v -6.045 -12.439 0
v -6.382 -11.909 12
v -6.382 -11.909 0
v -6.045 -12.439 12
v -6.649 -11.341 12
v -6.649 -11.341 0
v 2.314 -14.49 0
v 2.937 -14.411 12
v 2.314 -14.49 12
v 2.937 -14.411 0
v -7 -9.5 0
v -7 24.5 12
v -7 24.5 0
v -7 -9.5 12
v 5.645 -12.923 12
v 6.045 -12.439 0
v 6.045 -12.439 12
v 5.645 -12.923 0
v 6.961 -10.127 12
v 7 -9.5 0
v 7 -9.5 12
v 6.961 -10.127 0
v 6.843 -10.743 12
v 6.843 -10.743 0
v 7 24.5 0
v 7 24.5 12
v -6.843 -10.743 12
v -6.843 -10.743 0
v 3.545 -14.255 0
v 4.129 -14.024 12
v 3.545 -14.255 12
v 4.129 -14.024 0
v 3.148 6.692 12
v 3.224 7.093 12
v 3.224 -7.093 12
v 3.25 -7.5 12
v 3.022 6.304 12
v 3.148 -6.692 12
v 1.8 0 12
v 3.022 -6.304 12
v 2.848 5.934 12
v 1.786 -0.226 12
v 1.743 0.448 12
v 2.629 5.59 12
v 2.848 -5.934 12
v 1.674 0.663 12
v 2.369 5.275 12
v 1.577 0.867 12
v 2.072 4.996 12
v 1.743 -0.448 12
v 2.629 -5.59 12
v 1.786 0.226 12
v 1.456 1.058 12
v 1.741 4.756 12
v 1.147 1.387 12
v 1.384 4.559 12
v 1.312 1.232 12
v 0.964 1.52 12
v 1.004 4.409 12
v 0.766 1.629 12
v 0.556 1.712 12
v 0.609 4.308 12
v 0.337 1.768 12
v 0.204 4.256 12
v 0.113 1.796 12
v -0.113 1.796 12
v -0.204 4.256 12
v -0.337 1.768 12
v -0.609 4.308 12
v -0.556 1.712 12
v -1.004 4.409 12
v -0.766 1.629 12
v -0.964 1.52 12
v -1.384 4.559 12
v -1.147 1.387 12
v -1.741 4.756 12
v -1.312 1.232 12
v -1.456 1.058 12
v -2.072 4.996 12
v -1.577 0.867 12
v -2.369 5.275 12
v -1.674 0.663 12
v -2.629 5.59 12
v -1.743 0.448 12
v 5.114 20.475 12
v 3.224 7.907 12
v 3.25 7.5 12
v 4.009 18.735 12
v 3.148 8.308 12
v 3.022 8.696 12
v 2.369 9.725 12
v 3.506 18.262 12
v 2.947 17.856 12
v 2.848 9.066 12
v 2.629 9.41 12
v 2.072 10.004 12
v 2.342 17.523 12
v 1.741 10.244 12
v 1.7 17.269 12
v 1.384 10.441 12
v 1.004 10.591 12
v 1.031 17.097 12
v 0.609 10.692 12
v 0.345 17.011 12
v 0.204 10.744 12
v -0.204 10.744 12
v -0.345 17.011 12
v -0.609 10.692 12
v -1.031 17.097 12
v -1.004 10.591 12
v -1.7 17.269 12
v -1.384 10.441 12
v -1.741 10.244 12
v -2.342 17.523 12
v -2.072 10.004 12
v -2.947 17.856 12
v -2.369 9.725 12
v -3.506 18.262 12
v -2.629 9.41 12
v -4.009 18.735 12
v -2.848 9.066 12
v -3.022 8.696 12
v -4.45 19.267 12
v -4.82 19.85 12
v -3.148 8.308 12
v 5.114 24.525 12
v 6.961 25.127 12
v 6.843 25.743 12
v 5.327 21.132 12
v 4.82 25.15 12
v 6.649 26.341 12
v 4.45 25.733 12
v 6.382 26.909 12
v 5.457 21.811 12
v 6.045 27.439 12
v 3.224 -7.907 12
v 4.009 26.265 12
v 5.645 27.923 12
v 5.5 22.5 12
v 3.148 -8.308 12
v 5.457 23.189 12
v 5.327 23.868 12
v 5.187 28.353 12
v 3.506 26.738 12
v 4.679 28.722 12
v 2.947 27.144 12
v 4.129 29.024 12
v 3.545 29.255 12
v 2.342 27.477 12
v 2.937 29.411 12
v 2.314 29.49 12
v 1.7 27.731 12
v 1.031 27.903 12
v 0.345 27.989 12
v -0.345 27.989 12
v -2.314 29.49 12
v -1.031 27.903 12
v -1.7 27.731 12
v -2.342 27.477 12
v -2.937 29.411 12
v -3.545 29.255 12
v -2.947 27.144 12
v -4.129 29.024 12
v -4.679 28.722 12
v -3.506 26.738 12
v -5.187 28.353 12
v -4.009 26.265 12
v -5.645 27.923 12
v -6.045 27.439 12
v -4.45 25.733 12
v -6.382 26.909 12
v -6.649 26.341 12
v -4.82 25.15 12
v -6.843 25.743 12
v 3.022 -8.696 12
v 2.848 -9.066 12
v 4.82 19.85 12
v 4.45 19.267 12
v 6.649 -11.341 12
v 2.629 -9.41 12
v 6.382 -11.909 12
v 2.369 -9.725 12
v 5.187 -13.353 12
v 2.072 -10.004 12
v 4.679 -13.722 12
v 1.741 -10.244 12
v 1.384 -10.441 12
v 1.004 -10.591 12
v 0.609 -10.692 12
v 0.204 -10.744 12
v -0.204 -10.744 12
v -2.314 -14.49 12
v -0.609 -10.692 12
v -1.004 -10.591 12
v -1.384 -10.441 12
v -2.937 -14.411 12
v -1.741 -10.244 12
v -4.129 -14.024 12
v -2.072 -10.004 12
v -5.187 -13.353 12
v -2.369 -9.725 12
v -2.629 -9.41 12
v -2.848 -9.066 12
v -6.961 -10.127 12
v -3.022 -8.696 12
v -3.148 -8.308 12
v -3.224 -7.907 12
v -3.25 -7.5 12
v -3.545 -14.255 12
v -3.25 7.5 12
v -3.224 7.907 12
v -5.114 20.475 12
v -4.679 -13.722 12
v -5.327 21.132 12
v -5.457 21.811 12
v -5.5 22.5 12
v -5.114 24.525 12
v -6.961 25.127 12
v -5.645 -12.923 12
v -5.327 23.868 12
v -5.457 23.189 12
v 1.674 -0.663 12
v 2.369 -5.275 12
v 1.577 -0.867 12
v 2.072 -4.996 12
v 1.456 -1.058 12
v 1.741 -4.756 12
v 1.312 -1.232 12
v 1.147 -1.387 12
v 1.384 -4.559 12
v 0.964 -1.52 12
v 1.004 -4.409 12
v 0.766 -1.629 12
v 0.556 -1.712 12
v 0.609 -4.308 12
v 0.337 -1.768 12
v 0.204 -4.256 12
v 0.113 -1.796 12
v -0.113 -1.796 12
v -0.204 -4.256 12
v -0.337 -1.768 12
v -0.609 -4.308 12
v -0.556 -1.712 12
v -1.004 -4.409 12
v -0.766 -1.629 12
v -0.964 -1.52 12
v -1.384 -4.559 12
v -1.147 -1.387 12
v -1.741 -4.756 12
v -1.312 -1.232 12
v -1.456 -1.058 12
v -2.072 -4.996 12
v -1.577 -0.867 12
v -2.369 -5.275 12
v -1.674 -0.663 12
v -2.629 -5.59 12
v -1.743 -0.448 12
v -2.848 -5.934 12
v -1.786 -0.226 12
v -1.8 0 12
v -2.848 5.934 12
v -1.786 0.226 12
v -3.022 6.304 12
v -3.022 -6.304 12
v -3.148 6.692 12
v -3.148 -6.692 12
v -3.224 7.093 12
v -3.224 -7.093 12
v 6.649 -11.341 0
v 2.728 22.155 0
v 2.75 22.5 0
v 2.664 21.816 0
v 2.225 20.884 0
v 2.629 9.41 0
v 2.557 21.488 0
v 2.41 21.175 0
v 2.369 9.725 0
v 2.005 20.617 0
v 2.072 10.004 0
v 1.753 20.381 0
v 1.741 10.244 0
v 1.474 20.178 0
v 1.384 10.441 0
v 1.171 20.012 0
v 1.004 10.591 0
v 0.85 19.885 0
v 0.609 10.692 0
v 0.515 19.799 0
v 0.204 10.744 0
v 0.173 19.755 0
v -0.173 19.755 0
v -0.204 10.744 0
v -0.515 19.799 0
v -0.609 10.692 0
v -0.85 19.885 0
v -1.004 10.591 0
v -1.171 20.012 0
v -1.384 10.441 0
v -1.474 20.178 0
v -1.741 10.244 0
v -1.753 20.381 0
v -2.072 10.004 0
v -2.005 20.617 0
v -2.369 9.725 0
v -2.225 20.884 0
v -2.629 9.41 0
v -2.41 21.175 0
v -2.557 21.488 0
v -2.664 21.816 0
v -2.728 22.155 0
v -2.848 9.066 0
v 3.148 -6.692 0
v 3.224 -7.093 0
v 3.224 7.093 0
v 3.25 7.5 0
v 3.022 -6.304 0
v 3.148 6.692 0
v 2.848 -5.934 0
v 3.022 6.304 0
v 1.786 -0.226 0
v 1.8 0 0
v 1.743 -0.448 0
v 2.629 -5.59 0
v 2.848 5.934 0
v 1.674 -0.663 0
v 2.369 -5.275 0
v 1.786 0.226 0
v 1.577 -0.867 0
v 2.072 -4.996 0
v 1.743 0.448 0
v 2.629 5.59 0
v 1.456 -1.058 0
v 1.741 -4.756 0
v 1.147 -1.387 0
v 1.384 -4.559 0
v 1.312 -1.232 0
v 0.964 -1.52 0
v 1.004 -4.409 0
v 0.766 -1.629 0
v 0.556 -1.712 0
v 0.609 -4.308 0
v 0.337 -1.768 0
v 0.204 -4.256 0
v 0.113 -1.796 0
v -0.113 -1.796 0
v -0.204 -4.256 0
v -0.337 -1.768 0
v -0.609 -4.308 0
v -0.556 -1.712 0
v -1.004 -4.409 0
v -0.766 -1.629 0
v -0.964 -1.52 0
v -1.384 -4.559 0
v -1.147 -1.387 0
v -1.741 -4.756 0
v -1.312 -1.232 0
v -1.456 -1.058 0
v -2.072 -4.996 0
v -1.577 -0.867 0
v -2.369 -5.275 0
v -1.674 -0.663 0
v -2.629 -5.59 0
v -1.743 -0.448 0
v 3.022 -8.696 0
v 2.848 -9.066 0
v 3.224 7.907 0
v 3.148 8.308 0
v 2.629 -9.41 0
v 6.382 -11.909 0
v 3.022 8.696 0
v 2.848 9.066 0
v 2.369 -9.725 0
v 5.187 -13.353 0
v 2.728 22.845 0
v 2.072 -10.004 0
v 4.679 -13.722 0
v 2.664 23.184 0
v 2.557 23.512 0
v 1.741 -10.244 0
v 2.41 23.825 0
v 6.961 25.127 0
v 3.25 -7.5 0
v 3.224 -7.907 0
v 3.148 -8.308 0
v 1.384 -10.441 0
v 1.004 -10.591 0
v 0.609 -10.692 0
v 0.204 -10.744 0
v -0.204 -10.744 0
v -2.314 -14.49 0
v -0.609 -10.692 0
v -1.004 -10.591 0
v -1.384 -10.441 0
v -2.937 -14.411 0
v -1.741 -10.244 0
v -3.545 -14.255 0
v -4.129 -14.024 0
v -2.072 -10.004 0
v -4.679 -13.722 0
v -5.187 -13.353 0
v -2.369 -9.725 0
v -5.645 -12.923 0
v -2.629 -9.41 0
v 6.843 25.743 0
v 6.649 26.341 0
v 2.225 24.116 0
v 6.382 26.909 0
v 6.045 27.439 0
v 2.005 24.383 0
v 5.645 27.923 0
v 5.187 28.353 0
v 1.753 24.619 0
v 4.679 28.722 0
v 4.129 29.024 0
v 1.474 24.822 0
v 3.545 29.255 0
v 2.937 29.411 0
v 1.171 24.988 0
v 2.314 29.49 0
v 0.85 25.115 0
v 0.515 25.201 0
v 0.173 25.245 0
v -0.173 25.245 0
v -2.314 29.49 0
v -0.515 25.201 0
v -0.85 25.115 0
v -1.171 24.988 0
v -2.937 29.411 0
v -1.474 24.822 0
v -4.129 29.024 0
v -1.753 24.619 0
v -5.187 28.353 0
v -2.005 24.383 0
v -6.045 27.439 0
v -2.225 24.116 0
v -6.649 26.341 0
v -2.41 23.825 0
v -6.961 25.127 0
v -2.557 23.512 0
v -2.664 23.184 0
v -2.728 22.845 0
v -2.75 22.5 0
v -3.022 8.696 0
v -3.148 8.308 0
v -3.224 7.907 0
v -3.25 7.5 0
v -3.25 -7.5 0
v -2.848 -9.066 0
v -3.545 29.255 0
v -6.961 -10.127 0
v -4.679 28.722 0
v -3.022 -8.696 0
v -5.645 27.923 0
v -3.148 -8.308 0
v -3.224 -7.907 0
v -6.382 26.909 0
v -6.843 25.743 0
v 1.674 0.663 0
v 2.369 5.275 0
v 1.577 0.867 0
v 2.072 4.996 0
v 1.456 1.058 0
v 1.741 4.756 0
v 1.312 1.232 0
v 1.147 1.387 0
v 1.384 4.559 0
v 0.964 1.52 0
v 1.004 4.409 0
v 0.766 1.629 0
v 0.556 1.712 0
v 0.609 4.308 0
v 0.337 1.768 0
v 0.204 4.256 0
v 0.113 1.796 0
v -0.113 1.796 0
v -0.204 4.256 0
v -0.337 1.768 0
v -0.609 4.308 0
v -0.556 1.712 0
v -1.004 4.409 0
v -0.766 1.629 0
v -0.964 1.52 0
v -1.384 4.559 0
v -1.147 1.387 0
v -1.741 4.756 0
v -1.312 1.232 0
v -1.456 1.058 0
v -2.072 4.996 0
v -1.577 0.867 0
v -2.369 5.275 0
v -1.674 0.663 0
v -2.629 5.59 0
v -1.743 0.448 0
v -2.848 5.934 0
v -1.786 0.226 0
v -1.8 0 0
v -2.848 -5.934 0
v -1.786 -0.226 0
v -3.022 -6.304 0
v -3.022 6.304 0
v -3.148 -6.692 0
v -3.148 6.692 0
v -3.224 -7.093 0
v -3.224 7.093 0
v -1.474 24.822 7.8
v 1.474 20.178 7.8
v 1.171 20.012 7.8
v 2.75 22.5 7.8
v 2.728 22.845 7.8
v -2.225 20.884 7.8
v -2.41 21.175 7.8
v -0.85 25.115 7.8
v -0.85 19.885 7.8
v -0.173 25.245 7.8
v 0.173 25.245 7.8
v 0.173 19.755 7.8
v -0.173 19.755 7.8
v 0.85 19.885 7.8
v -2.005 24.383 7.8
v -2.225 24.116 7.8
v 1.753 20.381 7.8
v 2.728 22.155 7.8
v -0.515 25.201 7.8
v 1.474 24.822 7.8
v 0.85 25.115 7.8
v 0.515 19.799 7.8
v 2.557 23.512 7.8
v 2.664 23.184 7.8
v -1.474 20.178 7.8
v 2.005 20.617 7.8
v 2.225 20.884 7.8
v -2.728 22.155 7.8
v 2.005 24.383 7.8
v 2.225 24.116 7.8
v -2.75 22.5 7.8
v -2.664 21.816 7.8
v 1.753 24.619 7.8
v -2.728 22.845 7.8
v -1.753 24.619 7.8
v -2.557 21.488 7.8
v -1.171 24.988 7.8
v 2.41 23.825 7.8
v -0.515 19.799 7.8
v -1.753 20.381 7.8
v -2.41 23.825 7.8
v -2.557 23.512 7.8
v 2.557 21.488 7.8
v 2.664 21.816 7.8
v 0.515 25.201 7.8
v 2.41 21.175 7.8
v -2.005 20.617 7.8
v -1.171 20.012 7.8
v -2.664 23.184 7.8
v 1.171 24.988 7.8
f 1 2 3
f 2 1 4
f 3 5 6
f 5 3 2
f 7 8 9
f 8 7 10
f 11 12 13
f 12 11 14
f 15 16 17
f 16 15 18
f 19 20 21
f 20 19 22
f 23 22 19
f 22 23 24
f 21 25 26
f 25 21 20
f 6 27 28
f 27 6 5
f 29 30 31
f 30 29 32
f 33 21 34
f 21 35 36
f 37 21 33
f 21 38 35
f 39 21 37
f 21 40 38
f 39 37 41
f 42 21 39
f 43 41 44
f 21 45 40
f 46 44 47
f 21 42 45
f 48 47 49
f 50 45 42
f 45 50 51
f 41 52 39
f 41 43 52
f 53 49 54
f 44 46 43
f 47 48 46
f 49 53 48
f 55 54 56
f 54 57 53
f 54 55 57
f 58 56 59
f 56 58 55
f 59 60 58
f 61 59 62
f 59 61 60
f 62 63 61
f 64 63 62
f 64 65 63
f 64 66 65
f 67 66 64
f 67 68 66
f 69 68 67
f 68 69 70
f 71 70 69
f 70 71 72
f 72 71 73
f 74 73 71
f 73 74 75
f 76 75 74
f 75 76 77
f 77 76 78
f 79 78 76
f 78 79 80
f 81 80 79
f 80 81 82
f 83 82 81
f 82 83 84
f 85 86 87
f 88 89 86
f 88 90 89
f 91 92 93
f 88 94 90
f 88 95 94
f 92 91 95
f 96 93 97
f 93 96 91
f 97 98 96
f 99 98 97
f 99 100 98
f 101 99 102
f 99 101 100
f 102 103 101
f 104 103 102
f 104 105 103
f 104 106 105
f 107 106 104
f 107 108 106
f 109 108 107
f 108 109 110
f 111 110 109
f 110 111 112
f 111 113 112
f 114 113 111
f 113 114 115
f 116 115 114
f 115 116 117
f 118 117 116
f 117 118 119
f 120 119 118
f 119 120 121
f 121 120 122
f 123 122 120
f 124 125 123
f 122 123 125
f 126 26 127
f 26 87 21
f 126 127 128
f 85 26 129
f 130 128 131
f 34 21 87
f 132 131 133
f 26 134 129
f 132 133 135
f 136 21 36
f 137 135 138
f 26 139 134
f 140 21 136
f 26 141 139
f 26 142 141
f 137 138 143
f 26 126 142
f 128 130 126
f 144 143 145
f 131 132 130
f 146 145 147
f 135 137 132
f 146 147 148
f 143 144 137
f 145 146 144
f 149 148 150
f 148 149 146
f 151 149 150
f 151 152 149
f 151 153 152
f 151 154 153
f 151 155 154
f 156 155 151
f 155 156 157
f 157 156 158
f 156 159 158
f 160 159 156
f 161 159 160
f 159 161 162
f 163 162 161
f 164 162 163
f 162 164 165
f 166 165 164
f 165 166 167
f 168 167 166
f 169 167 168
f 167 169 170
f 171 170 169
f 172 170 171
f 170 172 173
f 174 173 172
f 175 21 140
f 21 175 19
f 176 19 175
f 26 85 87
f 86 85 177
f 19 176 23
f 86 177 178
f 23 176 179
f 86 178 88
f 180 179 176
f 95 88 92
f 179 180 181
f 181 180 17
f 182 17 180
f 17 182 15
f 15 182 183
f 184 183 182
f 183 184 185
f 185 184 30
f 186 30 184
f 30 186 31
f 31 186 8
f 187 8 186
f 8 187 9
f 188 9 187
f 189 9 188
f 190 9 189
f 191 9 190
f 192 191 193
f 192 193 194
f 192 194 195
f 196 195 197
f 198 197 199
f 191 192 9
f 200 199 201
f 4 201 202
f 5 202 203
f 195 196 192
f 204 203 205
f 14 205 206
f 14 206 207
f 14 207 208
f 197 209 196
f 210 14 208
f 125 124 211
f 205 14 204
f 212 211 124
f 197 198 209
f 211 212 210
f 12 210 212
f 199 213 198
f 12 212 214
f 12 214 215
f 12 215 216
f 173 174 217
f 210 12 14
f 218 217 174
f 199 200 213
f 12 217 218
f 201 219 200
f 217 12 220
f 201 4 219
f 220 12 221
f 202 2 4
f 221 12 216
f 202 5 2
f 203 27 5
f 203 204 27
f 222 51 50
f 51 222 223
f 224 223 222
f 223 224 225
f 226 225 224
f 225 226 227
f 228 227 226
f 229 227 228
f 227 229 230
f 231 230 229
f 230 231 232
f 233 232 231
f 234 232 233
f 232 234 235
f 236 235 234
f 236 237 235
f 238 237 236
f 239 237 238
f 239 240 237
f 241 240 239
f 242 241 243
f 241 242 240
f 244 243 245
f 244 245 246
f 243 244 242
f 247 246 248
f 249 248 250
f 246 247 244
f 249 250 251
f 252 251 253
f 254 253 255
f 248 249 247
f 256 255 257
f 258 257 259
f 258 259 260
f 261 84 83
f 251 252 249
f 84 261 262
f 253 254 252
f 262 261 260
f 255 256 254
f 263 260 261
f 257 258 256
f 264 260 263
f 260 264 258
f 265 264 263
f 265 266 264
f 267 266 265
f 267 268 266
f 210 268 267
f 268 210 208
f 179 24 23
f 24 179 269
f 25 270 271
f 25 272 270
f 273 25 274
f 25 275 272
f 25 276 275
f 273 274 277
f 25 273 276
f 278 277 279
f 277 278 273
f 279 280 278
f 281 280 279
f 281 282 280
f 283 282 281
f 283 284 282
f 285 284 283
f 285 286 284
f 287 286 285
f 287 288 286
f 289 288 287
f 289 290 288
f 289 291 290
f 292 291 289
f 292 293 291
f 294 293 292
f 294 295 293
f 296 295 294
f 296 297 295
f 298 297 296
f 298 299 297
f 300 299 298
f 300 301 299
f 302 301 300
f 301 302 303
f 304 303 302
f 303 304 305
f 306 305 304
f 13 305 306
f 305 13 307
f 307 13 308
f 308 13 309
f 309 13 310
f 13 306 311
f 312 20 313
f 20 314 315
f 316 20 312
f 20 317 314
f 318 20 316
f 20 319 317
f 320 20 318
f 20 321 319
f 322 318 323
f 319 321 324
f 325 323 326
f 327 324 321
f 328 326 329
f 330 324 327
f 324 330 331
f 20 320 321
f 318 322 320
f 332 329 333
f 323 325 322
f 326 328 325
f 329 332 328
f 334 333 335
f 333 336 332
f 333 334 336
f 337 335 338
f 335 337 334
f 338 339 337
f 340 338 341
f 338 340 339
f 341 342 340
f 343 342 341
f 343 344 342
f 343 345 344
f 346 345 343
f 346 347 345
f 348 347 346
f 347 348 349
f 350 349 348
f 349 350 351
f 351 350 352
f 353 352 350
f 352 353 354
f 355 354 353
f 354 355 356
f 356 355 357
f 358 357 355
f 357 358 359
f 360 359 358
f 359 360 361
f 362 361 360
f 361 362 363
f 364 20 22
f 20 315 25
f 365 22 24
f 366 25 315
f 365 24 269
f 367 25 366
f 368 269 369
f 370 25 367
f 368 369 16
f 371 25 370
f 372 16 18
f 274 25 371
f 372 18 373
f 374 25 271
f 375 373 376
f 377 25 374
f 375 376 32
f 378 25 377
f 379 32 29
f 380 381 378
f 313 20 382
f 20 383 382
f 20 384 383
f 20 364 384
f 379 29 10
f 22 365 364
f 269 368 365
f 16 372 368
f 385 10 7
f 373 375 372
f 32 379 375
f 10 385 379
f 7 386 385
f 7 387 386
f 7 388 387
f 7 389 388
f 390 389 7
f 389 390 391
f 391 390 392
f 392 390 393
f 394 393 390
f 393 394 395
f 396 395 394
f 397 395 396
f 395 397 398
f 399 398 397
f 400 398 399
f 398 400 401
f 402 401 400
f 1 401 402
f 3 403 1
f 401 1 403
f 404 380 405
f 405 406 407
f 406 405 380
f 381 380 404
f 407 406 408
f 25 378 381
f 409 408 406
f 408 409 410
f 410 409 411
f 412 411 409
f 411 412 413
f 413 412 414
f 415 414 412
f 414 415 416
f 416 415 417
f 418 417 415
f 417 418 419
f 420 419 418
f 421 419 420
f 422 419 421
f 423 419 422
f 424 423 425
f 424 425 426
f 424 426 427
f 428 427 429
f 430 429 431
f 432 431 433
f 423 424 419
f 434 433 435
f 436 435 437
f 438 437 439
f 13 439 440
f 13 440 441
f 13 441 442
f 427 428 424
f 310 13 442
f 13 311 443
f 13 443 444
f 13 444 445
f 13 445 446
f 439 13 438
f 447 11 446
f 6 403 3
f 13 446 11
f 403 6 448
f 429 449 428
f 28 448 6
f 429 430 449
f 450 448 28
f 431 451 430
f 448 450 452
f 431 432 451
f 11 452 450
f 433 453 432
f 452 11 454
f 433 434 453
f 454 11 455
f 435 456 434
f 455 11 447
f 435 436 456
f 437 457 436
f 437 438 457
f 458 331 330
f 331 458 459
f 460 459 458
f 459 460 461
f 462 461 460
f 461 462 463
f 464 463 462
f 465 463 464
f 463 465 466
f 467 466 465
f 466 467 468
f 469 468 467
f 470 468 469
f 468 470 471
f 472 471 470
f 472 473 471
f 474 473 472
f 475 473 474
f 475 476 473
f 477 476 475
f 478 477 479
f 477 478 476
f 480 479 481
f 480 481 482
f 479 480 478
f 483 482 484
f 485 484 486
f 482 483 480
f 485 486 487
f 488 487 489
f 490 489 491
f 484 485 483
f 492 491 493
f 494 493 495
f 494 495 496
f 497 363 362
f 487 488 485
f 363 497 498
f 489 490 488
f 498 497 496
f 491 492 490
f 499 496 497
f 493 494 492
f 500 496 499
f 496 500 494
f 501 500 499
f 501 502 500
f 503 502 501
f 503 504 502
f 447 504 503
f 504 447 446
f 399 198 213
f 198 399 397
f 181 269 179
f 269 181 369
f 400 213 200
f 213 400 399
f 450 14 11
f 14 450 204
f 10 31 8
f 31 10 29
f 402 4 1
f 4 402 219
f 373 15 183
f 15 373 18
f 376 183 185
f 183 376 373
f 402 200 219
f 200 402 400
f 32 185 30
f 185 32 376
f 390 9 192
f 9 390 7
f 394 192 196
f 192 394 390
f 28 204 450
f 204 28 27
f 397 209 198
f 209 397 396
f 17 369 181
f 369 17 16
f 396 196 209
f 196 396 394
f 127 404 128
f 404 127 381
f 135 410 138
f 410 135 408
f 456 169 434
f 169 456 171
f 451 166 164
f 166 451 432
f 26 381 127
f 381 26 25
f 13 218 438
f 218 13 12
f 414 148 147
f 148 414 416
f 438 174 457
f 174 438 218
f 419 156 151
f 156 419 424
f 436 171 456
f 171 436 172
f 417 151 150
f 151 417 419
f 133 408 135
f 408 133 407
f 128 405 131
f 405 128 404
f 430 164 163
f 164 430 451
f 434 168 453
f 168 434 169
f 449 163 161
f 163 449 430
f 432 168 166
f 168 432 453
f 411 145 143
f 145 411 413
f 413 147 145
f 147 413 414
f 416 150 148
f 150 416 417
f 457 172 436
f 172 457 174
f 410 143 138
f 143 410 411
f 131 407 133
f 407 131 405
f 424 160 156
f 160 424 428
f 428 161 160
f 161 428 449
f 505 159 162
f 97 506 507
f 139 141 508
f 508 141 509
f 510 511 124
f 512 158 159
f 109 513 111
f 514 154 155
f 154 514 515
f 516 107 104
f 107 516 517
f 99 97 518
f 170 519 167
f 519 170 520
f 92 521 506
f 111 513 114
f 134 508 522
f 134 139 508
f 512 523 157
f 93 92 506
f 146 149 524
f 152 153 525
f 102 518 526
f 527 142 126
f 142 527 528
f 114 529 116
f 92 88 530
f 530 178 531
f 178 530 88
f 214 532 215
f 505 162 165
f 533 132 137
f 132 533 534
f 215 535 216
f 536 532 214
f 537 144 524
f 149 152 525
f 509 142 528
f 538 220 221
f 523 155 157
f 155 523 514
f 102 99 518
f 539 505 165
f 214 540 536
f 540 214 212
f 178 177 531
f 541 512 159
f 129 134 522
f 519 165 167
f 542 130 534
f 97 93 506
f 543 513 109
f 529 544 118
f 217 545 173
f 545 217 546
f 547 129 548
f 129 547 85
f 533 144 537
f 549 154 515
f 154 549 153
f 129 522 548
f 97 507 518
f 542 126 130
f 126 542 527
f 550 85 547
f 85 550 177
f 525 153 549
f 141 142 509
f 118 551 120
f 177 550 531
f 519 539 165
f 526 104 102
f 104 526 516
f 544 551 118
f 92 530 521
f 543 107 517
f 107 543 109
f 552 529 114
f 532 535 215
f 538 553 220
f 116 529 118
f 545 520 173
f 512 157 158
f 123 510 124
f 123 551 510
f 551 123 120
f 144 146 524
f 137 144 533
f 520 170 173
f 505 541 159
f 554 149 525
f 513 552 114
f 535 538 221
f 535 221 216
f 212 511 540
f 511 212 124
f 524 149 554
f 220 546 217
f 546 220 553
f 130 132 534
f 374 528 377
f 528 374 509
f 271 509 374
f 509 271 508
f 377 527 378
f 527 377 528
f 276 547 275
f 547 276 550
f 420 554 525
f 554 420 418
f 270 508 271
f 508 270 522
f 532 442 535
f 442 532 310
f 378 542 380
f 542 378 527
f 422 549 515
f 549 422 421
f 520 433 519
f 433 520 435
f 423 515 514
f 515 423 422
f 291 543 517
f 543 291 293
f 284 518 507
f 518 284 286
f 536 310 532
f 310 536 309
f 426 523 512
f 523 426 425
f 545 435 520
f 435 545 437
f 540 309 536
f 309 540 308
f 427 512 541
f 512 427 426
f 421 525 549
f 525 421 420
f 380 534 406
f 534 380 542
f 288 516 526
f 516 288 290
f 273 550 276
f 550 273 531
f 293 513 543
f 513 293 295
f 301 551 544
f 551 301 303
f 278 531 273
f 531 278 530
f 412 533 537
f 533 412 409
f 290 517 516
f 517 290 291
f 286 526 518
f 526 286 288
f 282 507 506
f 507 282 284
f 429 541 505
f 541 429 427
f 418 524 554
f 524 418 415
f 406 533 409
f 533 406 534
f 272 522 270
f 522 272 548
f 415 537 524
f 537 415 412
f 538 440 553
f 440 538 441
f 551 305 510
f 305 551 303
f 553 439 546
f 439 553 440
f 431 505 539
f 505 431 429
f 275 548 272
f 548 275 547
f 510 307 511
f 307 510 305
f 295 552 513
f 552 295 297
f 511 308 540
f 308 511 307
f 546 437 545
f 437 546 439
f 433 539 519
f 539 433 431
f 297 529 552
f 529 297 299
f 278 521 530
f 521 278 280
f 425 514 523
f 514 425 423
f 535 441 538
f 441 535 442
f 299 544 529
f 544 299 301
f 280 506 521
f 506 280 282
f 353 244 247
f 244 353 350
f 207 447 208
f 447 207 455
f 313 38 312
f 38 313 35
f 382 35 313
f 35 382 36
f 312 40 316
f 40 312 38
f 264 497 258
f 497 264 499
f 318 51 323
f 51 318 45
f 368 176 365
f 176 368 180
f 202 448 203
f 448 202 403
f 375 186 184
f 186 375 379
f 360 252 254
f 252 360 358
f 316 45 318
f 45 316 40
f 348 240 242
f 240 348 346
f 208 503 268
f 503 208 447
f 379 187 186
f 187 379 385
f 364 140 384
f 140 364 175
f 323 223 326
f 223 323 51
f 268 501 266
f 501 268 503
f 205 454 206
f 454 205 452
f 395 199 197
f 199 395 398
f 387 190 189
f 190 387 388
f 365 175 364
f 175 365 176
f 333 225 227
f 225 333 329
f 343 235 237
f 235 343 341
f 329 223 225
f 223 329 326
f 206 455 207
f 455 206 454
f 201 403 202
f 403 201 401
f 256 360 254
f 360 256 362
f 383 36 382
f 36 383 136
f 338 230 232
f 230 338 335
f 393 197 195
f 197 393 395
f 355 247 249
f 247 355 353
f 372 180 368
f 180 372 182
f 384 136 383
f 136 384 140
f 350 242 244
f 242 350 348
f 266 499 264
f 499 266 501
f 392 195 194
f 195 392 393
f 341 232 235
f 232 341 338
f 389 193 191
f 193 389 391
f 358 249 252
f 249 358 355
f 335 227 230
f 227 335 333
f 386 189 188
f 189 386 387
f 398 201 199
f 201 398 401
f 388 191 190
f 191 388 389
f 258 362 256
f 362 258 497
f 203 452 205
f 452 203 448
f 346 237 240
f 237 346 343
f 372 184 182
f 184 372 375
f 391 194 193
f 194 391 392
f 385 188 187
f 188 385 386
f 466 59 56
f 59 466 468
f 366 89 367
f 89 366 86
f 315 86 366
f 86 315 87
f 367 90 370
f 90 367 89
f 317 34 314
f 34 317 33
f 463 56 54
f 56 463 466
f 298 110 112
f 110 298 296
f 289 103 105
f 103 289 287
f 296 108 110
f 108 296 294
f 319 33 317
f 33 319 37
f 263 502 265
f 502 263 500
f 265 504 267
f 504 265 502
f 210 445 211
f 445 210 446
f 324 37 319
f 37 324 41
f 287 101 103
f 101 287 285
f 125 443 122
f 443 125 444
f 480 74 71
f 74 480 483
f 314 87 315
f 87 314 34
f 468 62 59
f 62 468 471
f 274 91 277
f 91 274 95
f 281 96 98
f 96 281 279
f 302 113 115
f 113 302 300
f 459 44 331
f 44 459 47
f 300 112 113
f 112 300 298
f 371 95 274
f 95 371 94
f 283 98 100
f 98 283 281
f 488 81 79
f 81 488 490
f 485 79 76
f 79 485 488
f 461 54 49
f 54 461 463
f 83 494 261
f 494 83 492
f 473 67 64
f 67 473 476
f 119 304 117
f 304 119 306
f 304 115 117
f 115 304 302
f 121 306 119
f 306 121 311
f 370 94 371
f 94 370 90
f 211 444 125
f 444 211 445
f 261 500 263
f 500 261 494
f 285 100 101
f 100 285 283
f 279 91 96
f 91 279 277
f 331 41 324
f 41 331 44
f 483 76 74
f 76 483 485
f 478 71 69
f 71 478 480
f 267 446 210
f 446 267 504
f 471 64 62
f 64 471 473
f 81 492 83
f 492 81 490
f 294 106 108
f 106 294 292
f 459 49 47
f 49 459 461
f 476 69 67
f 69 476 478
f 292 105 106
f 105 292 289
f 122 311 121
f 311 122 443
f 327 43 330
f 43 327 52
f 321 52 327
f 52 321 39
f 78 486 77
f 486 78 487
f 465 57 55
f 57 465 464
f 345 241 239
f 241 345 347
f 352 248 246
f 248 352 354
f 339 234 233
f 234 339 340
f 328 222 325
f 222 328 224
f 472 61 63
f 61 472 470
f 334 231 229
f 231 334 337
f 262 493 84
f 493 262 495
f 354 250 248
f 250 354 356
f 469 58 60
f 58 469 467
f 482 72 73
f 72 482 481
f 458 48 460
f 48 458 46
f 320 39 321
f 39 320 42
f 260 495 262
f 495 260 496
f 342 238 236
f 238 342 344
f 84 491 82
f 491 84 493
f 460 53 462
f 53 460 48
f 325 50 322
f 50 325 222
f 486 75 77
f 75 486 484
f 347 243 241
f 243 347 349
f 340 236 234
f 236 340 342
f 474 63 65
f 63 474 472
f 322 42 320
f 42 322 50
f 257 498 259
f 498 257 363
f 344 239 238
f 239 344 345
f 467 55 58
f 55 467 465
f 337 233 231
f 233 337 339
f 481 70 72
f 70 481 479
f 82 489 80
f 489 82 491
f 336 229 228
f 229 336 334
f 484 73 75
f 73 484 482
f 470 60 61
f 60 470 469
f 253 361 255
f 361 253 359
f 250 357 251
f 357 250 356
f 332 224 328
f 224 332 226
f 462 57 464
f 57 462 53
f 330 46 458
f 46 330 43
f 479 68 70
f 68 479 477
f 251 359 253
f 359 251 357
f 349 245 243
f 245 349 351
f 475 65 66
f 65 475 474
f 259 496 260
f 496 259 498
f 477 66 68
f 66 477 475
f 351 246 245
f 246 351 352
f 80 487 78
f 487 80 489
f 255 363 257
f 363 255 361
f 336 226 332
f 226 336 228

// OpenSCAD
$fn = 50;


difference() {
	union() {
		hull() {
			translate(v = [-2.0000000000, 9.5000000000, 0]) {
				cylinder(h = 12, r = 5);
			}
			translate(v = [2.0000000000, 9.5000000000, 0]) {
				cylinder(h = 12, r = 5);
			}
			translate(v = [-2.0000000000, -9.5000000000, 0]) {
				cylinder(h = 12, r = 5);
			}
			translate(v = [2.0000000000, -9.5000000000, 0]) {
				cylinder(h = 12, r = 5);
			}
		}
		translate(v = [0.0000000000, 15.0000000000, 0]) {
			hull() {
				translate(v = [-2.0000000000, 9.5000000000, 0]) {
					cylinder(h = 12, r = 5);
				}
				translate(v = [2.0000000000, 9.5000000000, 0]) {
					cylinder(h = 12, r = 5);
				}
				translate(v = [-2.0000000000, -9.5000000000, 0]) {
					cylinder(h = 12, r = 5);
				}
				translate(v = [2.0000000000, -9.5000000000, 0]) {
					cylinder(h = 12, r = 5);
				}
			}
		}
		translate(v = [0.0000000000, 15.0000000000, 0]) {
			hull() {
				translate(v = [-2.0000000000, 9.5000000000, 0]) {
					cylinder(h = 12, r = 5);
				}
				translate(v = [2.0000000000, 9.5000000000, 0]) {
					cylinder(h = 12, r = 5);
				}
				translate(v = [-2.0000000000, -9.5000000000, 0]) {
					cylinder(h = 12, r = 5);
				}
				translate(v = [2.0000000000, -9.5000000000, 0]) {
					cylinder(h = 12, r = 5);
				}
			}
		}
	}
	union() {
		translate(v = [0.0000000000, 22.5000000000, 12]) {
			rotate(a = [0, 0, 0]) {
				difference() {
					union() {
						#translate(v = [0, 0, -12.0000000000]) {
							cylinder(h = 12, r = 2.2500000000);
						}
						#translate(v = [0, 0, -4.2000000000]) {
							cylinder(h = 4.2000000000, r1 = 2.7500000000, r2 = 5.5000000000);
						}
						#translate(v = [0, 0, -12.0000000000]) {
							cylinder(h = 12, r = 2.7500000000);
						}
						#translate(v = [0, 0, -12.0000000000]) {
							cylinder(h = 12, r = 2.2500000000);
						}
					}
					union();
				}
			}
		}
		translate(v = [0.0000000000, 22.5000000000, 12]) {
			rotate(a = [0, 0, 0]) {
				difference() {
					union() {
						#translate(v = [0, 0, -12.0000000000]) {
							cylinder(h = 12, r = 2.2500000000);
						}
						#translate(v = [0, 0, -4.2000000000]) {
							cylinder(h = 4.2000000000, r1 = 2.7500000000, r2 = 5.5000000000);
						}
						#translate(v = [0, 0, -12.0000000000]) {
							cylinder(h = 12, r = 2.7500000000);
						}
						#translate(v = [0, 0, -12.0000000000]) {
							cylinder(h = 12, r = 2.2500000000);
						}
					}
					union();
				}
			}
		}
		translate(v = [0.0000000000, -7.5000000000, 0]) {
			translate(v = [0, 0, -100]) {
				cylinder(h = 200, r = 3.2500000000);
			}
		}
		translate(v = [0.0000000000, 7.5000000000, 0]) {
			translate(v = [0, 0, -100]) {
				cylinder(h = 200, r = 3.2500000000);
			}
		}
		translate(v = [0.0000000000, -7.5000000000, 0]) {
			translate(v = [0, 0, -100]) {
				cylinder(h = 200, r = 1.8000000000);
			}
		}
		translate(v = [0, 0, -100]) {
			cylinder(h = 200, r = 1.8000000000);
		}
		translate(v = [0.0000000000, 7.5000000000, 0]) {
			translate(v = [0, 0, -100]) {
				cylinder(h = 200, r = 1.8000000000);
			}
		}
	}
}
